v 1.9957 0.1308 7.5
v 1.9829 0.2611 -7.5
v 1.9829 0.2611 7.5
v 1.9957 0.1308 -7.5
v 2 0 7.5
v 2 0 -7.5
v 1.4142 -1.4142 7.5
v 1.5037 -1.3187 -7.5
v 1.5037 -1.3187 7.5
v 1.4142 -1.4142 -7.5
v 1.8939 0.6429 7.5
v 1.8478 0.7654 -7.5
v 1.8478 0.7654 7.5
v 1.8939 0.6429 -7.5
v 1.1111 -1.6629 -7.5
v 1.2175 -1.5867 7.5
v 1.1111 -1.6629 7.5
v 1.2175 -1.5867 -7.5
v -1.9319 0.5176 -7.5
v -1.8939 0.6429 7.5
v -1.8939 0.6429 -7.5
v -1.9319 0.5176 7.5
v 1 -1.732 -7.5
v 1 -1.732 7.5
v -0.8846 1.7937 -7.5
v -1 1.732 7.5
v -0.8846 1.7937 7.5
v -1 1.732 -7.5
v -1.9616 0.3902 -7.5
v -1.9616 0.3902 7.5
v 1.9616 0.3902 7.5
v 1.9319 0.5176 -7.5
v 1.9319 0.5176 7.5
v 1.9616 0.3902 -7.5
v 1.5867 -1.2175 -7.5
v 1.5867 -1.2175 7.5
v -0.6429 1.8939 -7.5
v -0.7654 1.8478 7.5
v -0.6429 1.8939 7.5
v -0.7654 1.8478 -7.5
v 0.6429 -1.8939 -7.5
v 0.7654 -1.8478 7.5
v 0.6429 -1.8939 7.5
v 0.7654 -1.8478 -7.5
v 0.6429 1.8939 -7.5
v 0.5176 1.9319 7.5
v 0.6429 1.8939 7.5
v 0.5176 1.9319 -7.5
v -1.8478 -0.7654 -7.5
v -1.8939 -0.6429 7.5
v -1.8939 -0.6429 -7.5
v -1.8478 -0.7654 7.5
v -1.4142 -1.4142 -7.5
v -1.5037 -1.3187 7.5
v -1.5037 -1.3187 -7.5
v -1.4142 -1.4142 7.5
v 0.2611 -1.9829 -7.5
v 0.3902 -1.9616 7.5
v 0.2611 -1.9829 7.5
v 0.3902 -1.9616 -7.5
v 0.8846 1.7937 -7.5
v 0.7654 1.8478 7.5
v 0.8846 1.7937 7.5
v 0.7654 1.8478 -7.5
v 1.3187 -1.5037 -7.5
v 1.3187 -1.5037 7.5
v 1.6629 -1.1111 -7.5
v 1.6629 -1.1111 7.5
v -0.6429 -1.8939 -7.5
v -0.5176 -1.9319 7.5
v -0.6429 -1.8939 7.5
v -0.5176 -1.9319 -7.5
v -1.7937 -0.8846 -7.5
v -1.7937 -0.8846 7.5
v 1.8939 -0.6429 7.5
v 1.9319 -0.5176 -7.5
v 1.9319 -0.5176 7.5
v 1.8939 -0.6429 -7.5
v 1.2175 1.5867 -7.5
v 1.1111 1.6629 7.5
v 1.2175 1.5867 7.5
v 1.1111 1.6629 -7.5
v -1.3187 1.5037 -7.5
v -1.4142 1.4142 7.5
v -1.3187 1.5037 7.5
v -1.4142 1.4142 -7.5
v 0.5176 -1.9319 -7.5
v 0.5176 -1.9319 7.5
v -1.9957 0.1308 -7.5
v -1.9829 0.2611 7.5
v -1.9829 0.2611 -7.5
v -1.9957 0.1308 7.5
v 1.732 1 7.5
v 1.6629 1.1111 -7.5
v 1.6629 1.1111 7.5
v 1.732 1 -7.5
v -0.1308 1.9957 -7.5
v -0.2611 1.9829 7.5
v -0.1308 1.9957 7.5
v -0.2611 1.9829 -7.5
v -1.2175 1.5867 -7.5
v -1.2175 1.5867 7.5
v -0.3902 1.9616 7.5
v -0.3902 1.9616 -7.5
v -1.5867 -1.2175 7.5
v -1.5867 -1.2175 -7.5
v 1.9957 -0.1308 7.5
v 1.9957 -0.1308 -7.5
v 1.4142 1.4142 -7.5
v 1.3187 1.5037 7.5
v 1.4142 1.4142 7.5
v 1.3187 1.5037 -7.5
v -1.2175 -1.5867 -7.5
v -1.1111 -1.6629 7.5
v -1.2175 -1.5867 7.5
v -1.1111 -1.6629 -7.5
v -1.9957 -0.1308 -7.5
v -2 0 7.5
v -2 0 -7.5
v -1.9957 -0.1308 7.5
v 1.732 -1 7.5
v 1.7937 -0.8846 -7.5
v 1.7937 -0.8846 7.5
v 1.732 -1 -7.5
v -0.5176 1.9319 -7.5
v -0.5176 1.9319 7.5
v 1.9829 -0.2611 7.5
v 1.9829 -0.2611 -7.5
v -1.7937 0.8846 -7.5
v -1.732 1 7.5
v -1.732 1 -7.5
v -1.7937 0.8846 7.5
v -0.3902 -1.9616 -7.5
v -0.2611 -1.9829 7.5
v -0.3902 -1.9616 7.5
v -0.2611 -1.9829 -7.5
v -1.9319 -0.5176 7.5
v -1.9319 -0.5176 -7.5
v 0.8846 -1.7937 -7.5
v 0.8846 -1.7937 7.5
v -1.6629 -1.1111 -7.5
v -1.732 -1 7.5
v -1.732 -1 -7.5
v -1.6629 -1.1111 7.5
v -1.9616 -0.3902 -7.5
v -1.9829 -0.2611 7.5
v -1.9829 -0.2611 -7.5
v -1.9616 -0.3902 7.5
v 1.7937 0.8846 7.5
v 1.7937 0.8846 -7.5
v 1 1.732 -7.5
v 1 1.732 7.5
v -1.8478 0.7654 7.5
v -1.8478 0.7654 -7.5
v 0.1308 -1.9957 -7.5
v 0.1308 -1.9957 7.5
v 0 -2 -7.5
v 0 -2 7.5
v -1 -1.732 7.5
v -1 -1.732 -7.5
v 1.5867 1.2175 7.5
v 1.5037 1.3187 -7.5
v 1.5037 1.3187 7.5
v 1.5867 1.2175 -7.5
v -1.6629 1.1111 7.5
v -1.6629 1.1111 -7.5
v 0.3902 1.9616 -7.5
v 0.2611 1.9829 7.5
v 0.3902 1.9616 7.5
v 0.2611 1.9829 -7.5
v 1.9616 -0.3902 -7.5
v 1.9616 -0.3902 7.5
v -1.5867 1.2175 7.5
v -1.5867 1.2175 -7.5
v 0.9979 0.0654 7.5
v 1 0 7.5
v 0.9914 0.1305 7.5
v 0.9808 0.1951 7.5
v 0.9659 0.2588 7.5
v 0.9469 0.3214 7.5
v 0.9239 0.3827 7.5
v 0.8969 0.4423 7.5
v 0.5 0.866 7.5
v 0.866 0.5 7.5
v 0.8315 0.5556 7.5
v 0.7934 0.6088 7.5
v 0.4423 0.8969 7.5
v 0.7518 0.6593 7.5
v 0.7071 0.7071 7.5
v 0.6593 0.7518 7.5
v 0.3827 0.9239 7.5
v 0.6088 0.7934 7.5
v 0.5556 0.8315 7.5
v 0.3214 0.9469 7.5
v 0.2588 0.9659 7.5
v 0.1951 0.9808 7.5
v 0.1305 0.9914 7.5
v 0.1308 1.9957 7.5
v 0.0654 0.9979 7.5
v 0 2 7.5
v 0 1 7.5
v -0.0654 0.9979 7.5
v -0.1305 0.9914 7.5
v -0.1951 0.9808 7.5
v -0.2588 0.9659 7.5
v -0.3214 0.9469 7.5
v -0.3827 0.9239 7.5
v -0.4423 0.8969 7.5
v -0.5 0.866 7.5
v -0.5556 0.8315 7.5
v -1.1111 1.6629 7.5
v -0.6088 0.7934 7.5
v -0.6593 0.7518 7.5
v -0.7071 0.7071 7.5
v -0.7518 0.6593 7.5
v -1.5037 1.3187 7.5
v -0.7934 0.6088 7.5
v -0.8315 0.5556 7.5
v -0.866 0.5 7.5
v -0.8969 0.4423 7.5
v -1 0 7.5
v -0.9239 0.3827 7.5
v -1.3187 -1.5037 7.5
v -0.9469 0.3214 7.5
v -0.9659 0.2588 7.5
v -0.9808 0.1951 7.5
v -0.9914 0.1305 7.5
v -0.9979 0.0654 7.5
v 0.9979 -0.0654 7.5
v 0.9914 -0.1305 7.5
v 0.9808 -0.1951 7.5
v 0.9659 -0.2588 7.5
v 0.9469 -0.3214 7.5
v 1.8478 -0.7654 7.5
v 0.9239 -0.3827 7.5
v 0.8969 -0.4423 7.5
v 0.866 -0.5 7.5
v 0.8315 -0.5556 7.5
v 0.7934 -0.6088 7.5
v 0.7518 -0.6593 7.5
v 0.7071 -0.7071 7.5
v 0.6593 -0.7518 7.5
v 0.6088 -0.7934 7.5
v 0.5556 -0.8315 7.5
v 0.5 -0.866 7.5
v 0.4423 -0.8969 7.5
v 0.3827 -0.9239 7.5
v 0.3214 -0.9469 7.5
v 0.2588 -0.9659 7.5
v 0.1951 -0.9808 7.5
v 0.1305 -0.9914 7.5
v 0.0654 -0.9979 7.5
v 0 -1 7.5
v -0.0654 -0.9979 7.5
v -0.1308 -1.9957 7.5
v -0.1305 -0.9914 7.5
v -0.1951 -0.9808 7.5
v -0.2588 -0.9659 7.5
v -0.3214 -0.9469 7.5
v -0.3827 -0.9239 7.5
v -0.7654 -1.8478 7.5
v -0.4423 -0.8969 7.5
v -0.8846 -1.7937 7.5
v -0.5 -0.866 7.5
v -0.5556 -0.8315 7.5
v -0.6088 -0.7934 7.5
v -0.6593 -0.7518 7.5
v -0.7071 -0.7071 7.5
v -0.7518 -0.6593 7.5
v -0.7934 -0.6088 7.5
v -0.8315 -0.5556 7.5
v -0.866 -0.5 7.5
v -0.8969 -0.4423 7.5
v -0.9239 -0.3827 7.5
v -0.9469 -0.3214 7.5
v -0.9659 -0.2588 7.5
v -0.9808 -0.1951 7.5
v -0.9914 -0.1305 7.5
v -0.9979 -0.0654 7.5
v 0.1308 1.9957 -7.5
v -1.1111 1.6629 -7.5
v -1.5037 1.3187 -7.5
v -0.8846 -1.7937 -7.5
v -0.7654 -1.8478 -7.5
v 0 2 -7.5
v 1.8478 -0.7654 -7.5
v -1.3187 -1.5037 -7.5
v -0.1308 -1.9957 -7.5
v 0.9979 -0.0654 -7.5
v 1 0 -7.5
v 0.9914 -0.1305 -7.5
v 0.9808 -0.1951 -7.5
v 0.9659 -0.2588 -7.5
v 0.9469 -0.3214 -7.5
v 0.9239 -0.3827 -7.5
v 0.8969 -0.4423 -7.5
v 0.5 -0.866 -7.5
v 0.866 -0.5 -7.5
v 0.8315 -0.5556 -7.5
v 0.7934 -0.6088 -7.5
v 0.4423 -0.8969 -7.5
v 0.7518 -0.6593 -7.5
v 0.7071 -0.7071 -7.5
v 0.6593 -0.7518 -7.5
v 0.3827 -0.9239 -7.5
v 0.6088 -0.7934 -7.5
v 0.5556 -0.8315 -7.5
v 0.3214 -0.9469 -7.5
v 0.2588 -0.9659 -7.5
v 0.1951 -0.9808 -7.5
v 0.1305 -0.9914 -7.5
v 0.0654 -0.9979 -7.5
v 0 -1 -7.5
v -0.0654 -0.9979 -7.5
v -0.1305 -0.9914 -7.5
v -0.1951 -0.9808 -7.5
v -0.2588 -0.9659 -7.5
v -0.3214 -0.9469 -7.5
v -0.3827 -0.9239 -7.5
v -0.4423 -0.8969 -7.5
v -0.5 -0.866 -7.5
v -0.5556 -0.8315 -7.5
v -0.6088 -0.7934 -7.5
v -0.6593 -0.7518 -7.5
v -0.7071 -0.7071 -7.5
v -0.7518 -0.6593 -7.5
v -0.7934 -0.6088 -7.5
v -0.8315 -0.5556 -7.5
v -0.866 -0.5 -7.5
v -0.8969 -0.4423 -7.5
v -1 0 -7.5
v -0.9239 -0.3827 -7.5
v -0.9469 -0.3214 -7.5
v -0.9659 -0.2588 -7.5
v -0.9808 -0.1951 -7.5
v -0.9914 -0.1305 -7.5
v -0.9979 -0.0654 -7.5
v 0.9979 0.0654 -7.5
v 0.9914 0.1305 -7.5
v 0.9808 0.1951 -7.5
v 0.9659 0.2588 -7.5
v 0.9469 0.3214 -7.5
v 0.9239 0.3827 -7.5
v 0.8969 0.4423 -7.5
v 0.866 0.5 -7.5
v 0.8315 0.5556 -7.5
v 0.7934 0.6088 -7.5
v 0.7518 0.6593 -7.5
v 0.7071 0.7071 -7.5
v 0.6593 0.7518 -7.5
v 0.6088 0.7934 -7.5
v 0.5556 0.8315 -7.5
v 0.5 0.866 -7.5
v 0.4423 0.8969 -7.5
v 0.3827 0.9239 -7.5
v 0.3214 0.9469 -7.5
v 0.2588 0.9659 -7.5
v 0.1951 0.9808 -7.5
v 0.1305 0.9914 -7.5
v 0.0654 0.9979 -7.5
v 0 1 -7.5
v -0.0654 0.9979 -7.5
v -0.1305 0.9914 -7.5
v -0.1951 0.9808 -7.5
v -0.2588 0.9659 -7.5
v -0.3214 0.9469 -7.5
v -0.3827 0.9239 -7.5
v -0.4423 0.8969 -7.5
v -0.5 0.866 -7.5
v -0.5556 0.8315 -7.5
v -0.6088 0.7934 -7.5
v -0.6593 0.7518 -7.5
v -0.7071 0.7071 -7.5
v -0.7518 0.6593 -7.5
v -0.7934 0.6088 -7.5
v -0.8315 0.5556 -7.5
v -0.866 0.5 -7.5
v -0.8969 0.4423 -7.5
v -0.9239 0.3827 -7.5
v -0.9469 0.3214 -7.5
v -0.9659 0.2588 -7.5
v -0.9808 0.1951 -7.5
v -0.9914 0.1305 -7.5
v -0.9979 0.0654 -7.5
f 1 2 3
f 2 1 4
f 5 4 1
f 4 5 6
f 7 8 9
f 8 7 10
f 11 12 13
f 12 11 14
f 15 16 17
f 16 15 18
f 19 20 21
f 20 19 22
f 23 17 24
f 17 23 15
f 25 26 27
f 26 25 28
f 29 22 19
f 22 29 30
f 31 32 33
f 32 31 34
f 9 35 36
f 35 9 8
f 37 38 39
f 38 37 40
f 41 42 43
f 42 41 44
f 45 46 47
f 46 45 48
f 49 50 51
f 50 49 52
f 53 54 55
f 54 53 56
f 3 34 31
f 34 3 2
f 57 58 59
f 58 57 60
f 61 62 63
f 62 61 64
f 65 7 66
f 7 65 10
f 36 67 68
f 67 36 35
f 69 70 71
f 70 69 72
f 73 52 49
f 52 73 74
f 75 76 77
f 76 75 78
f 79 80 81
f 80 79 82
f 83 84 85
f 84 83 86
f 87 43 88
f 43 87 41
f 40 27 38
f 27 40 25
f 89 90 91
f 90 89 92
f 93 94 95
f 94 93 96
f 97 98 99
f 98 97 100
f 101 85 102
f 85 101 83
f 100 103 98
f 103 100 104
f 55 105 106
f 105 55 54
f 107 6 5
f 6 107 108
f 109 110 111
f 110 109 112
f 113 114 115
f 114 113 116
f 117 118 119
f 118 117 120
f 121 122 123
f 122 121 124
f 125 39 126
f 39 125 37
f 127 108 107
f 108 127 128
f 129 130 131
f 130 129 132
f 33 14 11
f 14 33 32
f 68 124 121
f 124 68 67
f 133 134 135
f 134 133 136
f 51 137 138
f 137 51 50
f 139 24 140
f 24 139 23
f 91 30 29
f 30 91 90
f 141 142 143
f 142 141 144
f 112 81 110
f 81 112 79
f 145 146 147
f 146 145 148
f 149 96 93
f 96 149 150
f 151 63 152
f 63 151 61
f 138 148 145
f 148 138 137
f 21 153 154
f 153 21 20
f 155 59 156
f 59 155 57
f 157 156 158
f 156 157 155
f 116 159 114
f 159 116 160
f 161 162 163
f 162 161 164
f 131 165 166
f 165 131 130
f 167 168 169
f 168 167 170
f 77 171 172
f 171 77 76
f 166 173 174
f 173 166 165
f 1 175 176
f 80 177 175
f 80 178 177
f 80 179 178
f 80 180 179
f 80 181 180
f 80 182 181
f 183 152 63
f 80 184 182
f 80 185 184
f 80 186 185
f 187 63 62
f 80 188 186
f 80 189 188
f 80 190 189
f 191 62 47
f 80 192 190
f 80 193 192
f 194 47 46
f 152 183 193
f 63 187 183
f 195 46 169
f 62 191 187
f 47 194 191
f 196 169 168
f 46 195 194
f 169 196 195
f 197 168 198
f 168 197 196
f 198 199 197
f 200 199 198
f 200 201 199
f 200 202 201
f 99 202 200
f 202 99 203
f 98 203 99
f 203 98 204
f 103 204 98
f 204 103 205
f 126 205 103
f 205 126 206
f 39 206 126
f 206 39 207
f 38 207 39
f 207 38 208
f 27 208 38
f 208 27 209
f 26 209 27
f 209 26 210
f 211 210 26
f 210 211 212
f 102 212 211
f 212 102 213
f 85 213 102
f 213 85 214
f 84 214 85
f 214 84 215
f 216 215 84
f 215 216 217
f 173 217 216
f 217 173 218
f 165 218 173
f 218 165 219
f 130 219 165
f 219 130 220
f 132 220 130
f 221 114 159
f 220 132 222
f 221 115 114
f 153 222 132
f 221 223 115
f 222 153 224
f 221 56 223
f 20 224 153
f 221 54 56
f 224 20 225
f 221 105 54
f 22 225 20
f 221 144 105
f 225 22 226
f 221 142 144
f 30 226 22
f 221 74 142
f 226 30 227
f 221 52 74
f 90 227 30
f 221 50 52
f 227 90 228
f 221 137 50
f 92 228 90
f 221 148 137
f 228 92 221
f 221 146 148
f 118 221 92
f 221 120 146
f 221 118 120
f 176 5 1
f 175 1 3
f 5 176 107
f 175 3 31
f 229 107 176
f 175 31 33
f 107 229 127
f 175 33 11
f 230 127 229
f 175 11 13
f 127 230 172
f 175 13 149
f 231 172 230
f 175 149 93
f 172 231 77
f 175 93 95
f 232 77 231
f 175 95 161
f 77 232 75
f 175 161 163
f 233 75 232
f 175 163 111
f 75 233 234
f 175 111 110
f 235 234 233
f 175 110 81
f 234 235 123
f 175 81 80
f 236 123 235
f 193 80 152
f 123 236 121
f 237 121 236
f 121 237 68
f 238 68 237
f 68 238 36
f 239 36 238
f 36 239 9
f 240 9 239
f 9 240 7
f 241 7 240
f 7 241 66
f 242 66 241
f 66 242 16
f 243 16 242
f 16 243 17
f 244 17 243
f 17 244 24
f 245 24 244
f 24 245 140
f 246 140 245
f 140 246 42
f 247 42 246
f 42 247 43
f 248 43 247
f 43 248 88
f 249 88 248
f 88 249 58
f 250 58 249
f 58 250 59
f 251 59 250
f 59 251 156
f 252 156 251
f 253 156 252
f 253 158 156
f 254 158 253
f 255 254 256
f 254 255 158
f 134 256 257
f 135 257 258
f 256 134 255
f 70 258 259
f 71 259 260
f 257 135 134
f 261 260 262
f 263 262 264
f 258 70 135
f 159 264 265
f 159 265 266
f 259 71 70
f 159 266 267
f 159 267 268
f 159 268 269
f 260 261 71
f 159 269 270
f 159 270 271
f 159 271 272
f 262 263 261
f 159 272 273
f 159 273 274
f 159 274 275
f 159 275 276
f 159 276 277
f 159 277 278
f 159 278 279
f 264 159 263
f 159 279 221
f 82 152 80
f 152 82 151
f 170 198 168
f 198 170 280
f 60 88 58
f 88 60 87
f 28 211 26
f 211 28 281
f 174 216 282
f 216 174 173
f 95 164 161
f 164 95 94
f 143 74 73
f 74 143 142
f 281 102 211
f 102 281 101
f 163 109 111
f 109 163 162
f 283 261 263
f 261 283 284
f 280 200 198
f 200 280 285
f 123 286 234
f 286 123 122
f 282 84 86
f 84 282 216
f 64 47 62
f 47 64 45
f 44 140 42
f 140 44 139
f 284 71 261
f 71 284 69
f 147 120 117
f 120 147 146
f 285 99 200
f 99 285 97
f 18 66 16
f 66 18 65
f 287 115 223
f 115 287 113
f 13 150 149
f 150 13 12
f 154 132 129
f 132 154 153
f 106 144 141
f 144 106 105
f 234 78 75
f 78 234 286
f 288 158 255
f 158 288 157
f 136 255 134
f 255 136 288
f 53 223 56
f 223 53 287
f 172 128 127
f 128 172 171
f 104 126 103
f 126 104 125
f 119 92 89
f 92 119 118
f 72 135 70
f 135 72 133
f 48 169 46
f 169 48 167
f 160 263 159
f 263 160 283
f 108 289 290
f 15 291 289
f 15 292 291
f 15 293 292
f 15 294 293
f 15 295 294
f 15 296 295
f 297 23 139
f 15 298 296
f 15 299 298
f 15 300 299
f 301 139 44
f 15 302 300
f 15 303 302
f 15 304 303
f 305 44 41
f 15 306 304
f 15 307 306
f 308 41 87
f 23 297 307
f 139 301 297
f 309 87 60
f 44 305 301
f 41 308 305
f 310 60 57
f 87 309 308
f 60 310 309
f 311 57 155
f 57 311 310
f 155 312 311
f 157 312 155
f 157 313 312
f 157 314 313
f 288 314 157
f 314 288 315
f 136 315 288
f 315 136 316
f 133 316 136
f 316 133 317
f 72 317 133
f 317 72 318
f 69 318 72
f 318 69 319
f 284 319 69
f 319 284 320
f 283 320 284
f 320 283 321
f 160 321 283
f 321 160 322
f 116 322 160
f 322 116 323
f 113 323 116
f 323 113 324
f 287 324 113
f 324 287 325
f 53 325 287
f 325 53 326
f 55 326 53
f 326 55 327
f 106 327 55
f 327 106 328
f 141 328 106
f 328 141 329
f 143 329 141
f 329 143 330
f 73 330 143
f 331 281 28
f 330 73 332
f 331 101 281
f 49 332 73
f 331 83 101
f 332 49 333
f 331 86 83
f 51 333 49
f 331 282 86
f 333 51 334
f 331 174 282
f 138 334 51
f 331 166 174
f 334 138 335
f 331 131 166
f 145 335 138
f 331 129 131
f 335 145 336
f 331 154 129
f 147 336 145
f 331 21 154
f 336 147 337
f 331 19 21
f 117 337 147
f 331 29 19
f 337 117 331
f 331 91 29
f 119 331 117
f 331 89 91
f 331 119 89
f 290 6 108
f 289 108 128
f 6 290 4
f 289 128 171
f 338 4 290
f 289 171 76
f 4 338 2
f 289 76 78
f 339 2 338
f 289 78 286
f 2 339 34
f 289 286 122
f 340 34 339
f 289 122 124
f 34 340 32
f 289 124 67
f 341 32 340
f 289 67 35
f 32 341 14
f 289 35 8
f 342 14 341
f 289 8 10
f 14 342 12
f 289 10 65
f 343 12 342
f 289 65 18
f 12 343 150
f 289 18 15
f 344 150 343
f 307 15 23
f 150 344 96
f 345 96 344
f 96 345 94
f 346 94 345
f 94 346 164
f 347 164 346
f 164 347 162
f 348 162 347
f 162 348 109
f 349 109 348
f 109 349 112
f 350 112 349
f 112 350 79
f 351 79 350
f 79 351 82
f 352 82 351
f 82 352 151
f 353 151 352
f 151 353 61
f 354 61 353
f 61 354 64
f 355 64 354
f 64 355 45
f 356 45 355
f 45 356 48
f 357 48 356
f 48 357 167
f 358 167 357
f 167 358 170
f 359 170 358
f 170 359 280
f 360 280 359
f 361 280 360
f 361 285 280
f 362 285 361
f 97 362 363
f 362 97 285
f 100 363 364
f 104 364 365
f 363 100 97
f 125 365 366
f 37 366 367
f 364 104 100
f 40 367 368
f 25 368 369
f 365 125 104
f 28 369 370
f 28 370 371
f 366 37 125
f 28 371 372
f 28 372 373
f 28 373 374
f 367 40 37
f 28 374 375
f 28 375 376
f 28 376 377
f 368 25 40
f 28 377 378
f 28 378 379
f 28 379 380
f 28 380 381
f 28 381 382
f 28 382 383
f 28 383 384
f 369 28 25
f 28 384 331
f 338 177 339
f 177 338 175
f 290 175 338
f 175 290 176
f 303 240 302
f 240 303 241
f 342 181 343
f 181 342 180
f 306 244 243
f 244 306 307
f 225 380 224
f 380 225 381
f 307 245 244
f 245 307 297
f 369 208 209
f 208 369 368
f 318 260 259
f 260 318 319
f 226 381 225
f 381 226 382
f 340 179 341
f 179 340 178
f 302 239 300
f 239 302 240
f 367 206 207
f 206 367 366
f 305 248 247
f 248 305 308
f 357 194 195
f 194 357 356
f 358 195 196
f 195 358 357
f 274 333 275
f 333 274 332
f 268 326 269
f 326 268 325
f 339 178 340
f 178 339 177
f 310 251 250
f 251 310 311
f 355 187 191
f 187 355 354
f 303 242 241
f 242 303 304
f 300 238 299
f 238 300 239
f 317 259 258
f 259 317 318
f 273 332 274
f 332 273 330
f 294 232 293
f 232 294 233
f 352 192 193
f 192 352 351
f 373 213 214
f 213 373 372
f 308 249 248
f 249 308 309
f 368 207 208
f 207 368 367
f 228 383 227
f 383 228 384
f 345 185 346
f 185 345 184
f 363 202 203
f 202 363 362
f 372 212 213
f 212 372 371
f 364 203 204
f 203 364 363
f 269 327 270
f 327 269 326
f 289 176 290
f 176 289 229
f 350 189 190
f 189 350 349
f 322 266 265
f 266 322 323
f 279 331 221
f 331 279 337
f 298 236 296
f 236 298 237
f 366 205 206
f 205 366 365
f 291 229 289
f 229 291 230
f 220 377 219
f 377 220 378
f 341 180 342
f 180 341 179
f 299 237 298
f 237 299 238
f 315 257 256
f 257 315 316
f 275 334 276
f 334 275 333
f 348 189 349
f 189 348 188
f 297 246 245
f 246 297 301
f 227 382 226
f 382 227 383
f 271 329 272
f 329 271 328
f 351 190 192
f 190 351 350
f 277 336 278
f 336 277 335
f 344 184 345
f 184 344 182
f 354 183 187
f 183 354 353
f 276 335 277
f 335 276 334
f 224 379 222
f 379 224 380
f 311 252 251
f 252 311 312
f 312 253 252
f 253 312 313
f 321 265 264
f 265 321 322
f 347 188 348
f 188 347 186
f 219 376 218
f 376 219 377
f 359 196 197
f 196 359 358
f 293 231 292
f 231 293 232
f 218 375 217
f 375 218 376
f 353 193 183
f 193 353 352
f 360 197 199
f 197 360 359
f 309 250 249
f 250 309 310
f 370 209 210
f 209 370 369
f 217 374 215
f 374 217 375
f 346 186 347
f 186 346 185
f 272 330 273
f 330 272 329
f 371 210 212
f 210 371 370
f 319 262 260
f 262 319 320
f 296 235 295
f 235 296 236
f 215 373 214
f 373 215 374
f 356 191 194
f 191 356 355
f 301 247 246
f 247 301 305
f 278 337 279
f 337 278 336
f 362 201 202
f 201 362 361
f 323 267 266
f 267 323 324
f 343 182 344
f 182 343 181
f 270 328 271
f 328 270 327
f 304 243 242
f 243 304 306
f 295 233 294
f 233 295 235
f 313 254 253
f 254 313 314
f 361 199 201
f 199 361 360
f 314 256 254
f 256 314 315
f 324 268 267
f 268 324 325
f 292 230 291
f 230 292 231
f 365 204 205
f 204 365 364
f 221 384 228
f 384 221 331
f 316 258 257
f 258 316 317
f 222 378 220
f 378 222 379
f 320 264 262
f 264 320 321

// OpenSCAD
// PTFE Tubing (cylindrical hollow tube)

// Parameters
od = 4;            //[2:8:0.1]  Outer diameter
id = 2;            //[1:6:0.1]  Inner diameter
length = 15;       //[7.5:30:0.5]
center = 1;        //[0:1:1]    1=centered on Z, 0=rests on Z=0
forced_id = 0;     //[0:6:0.1]  Override inner diameter if > 0
eps = 0.2;         //[0.01:1:0.01] Small overlap to ensure clean boolean

$fn = 96; // ensure circular cross-section

module tubing() {
    inner_d = (forced_id > 0) ? forced_id : id;
    inner_d_clamped = min(inner_d, od - 0.01); // prevent invalid/negative wall thickness

    zc = (center == 1) ? 0 : length/2;

    color([0.85, 0.85, 0.8])  // Off-white for PTFE
    translate([0, 0, zc])
    difference() {
        cylinder(d=od, h=length, center=true);
        cylinder(d=inner_d_clamped, h=length + 2*eps, center=true);
    }
}

tubing();
